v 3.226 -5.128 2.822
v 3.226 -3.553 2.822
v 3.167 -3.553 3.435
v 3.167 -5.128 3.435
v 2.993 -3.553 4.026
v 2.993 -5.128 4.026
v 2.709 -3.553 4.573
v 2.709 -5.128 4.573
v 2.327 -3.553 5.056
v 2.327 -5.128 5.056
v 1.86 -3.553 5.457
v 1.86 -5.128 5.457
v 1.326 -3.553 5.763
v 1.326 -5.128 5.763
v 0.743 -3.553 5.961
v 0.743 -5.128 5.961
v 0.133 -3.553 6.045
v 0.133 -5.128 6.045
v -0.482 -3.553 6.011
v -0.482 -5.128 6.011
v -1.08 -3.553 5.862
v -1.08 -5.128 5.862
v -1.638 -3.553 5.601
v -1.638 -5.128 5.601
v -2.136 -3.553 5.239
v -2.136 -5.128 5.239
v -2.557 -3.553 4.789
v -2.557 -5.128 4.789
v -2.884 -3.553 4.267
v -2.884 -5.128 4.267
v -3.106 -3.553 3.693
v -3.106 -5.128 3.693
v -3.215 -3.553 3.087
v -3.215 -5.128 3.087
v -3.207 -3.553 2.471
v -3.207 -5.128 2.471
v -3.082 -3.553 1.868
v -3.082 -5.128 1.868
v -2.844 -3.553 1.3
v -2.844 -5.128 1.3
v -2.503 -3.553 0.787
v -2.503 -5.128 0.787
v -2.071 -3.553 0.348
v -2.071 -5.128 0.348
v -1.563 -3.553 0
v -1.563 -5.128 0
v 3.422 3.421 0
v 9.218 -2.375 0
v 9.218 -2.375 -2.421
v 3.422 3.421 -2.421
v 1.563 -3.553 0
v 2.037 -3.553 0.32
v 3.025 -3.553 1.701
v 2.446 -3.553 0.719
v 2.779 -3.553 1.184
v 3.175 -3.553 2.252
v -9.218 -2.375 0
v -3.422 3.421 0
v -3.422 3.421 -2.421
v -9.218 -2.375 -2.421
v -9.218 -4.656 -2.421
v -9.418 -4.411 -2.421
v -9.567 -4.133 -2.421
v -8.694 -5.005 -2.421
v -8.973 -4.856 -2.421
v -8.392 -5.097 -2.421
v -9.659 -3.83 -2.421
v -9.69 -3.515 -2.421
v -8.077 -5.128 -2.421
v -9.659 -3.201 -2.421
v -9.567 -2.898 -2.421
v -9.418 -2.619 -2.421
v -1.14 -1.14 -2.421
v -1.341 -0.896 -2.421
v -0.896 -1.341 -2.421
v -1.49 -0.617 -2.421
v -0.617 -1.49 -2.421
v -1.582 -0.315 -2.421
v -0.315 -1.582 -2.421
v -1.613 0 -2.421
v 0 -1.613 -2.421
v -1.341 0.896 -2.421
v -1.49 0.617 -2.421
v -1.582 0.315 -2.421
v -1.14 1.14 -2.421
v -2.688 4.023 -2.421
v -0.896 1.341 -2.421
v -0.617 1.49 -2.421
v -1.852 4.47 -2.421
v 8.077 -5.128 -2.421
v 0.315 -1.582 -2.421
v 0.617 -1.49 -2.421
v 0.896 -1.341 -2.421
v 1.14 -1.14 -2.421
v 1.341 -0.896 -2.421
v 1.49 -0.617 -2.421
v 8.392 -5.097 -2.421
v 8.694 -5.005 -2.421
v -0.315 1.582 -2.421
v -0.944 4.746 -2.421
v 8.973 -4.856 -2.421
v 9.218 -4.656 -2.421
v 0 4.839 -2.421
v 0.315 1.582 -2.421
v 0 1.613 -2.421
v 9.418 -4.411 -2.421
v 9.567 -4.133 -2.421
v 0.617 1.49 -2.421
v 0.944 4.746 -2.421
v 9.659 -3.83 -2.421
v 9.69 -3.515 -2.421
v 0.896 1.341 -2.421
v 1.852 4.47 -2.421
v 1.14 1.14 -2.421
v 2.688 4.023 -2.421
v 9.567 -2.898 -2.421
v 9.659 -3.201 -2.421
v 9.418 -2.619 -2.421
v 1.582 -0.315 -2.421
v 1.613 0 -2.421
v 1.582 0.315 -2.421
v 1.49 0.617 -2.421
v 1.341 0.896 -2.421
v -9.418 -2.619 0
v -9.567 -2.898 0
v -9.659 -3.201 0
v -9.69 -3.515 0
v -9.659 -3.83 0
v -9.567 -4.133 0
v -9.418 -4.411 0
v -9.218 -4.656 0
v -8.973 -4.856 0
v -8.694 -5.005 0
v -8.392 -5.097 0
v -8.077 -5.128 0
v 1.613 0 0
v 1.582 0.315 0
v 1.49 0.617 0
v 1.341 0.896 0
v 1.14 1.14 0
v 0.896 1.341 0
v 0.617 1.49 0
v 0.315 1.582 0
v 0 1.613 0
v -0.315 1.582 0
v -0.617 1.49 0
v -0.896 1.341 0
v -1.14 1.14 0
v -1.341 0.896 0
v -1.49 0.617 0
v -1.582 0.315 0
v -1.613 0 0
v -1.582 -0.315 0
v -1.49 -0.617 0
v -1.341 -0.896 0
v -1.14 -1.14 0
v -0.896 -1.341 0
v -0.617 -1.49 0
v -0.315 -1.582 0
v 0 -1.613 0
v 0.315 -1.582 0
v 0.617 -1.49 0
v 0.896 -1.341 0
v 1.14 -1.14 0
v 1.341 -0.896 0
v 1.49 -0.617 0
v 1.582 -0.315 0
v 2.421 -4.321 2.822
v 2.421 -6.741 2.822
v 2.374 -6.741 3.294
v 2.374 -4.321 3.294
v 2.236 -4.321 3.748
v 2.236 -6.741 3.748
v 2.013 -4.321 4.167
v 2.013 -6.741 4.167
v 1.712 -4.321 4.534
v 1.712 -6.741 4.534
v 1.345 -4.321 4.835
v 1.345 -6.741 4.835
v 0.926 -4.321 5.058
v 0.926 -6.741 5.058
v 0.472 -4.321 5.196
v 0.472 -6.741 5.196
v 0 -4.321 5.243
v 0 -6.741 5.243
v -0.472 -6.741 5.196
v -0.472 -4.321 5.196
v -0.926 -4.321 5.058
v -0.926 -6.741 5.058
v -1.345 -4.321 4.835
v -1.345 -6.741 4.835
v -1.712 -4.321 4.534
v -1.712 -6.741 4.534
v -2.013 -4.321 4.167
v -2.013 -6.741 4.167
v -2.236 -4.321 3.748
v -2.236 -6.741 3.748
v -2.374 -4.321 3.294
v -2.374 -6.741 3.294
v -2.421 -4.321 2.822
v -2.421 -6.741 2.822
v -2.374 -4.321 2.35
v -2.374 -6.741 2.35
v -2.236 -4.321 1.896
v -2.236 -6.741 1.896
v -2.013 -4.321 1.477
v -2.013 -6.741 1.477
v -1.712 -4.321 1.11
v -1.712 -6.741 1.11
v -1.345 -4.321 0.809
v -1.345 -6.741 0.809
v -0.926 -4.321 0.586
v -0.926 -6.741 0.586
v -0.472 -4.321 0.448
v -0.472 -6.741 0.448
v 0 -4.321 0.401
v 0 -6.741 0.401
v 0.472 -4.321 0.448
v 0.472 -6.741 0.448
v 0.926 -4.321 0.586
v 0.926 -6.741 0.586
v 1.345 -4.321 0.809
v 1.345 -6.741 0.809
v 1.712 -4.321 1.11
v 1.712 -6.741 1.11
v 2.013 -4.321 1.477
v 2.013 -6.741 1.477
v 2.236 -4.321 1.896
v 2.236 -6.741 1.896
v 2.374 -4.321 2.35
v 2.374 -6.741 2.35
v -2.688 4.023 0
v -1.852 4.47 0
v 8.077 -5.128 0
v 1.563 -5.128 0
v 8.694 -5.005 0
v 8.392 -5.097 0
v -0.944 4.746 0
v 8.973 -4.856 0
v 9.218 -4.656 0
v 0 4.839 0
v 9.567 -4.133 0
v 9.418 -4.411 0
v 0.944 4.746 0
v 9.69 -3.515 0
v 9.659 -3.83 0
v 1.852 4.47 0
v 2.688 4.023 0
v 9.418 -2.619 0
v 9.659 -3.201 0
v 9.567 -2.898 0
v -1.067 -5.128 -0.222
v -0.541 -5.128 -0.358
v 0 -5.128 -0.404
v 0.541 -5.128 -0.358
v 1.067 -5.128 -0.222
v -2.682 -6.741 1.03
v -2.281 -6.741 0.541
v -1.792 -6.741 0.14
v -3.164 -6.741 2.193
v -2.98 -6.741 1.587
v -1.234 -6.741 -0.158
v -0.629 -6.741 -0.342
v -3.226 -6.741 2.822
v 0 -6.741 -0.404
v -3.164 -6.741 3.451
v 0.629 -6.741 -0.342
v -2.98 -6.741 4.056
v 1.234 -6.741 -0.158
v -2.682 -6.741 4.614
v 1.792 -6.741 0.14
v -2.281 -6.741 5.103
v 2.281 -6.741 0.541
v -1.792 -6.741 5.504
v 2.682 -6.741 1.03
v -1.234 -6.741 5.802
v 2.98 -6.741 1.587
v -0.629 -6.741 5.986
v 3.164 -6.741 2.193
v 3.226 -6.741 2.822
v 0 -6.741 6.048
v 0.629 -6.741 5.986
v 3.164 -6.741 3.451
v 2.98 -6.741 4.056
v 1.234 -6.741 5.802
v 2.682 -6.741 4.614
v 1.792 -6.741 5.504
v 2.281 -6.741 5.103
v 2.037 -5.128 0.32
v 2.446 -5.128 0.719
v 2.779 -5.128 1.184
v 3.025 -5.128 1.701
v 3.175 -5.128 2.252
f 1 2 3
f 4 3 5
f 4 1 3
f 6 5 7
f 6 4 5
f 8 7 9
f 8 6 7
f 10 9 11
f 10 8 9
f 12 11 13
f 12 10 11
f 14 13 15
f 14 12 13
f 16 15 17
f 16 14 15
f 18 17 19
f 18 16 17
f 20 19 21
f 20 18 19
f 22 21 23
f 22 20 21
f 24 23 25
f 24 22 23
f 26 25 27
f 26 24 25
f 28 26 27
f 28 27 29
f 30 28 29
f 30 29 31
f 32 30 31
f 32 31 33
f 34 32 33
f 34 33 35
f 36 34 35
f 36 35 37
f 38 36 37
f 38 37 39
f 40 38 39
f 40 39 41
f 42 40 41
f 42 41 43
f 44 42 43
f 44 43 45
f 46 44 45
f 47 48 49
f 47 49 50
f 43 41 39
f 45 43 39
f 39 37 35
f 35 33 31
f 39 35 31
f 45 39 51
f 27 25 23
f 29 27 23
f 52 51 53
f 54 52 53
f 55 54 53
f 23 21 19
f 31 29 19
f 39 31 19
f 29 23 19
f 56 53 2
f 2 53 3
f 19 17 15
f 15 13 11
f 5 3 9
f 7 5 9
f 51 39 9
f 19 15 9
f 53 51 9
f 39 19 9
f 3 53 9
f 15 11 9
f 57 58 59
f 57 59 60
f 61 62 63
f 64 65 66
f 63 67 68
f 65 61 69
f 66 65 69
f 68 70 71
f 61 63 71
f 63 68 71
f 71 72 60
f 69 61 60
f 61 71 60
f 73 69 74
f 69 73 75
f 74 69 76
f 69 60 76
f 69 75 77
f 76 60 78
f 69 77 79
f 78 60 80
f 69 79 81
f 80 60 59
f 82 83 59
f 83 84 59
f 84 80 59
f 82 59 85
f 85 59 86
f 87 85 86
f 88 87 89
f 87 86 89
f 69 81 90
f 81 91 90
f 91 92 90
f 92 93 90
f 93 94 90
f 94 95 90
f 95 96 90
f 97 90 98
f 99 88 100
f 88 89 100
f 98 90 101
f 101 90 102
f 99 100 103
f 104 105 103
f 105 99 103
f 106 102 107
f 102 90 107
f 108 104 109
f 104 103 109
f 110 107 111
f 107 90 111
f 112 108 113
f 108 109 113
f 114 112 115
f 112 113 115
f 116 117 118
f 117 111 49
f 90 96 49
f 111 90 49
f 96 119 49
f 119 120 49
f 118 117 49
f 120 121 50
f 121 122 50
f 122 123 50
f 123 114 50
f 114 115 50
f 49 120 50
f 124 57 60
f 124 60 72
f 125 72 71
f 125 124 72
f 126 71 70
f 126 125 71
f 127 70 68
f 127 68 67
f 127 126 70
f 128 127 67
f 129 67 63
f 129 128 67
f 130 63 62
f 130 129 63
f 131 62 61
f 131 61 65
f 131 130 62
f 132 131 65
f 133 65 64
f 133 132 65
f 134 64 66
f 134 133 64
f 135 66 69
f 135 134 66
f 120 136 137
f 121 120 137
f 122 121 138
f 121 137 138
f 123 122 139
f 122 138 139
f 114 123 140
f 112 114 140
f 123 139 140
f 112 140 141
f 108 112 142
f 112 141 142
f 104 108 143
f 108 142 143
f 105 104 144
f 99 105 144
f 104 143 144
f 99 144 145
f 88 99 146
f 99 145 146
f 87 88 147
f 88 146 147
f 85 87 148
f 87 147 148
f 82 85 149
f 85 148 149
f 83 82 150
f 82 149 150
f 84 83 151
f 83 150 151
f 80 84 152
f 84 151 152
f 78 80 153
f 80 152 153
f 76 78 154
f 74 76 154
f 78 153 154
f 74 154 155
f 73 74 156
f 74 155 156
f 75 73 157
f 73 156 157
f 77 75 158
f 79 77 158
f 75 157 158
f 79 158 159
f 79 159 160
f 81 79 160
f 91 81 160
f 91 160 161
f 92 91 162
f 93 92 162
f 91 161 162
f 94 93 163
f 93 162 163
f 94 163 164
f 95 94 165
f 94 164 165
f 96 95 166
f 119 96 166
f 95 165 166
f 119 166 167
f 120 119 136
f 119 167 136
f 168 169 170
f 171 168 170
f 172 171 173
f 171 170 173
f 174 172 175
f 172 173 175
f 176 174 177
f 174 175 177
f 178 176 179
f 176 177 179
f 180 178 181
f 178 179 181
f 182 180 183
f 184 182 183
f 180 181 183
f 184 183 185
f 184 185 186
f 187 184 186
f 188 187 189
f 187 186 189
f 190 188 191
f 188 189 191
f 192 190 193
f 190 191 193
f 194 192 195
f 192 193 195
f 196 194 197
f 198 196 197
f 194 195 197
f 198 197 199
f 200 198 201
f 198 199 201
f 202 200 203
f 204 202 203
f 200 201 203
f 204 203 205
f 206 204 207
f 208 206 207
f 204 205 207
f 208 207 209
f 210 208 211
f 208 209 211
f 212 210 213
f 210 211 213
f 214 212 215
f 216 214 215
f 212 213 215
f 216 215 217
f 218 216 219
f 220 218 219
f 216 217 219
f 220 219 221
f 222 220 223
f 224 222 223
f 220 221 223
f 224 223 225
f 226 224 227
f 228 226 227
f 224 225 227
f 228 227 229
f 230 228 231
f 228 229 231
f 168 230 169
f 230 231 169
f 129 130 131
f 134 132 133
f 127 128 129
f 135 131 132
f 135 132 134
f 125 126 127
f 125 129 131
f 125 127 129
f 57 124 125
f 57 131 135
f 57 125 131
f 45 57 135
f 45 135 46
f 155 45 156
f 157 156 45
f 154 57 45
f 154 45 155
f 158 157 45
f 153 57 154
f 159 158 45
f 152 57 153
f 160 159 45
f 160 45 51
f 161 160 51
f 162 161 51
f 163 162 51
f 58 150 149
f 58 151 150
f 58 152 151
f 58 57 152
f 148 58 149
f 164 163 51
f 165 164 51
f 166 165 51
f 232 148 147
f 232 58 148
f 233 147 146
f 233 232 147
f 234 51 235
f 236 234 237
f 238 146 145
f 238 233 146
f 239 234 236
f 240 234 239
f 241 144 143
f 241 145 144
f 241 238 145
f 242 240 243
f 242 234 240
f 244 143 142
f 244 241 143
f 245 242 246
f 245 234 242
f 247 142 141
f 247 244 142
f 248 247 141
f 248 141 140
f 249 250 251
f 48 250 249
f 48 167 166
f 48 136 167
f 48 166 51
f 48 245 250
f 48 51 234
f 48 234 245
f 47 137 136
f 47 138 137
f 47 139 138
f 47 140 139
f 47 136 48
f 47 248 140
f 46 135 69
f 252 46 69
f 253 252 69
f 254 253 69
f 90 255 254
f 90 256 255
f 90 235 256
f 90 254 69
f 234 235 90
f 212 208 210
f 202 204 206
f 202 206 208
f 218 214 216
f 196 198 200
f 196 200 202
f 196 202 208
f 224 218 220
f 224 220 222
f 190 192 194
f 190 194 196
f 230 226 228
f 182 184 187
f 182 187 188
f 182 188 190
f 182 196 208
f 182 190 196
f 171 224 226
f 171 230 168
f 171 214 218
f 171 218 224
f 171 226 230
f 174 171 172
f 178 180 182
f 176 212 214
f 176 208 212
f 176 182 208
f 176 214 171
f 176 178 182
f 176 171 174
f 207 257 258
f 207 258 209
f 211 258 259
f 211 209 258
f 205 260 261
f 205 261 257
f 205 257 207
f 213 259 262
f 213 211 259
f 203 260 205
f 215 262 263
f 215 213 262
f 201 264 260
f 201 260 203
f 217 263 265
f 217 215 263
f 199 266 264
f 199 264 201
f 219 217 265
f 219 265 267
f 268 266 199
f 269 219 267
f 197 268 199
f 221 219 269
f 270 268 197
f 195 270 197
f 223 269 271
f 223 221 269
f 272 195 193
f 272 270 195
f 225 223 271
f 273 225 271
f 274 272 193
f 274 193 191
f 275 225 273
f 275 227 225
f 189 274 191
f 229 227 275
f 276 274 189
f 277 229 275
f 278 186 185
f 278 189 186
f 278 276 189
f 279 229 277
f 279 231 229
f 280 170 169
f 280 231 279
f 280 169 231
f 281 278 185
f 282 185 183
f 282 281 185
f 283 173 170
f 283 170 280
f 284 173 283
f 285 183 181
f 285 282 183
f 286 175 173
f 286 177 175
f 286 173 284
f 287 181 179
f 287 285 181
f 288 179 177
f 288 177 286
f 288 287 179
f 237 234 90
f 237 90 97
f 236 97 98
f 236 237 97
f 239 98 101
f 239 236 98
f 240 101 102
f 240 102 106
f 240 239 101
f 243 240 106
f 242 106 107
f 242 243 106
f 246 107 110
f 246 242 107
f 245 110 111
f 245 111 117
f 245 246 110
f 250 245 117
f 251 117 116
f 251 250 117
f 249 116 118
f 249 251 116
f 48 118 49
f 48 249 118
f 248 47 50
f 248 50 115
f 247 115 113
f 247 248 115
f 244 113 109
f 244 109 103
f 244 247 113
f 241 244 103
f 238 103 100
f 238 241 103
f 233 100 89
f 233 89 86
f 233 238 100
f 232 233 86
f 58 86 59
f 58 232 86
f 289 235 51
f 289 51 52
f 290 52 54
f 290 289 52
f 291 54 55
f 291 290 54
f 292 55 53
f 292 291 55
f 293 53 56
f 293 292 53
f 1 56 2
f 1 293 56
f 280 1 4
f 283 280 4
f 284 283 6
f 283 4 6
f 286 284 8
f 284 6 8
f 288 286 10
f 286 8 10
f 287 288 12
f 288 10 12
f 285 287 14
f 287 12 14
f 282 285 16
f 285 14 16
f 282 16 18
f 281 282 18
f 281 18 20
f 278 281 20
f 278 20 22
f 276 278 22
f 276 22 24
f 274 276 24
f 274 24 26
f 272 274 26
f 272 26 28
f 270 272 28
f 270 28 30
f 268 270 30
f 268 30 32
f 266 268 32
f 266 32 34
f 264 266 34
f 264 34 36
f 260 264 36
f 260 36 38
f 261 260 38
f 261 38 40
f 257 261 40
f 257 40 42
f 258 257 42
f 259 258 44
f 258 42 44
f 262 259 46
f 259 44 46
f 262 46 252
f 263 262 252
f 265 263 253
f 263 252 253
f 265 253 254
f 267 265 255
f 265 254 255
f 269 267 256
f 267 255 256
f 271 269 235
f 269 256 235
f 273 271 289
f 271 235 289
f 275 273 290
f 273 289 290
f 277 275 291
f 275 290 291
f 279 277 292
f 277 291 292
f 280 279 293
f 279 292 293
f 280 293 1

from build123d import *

# Parameters (mm, degrees)
SKETCH1_R                = 1.6129
BOSS_EXTRUDE1_DEPTH      = 2.42062
SKETCH2_R                = 3.2258
BOSS_EXTRUDE2_DEPTH      = 1.6129
BOSS_EXTRUDE2_DEPTH_BACK = 1.5748
SKETCH3_R                = 2.42062
CUT_EXTRUDE1_DEPTH       = 2.42062


with BuildPart() as part:
    # Sketch1 → Boss-Extrude1 (new body)
    with BuildSketch(Plane.XY):
        with BuildLine():
            Line((-8.0772, -5.12826), (8.0772, -5.12826))
            ThreePointArc((8.0772, -5.12826), (9.567321834, -4.13259847), (9.217705328, -2.374880273))
            Line((9.217705328, -2.374880273), (3.421515983, 3.421439181))
            ThreePointArc((3.421515983, 3.421439181), (0, 4.8387), (-3.421515983, 3.421439181))
            Line((-3.421515983, 3.421439181), (-9.217705328, -2.374880273))
            ThreePointArc((-9.217705328, -2.374880273), (-9.567321834, -4.13259847), (-8.0772, -5.12826))
        make_face()
        Circle(SKETCH1_R, mode=Mode.SUBTRACT)
    extrude(amount=-BOSS_EXTRUDE1_DEPTH)

    # Sketch2 → Boss-Extrude2 (add, two sides)
    with BuildSketch(Plane.XZ.offset(5.12826)) as boss_extrude2_sk:
        with Locations((0, 2.82194)):
            Circle(SKETCH2_R)
    extrude(amount=BOSS_EXTRUDE2_DEPTH)
    extrude(boss_extrude2_sk.sketch, amount=-BOSS_EXTRUDE2_DEPTH_BACK)

    # Sketch3 → Cut-Extrude1 (cut)
    with BuildSketch(Plane.XZ.offset(6.74116)):
        with Locations((0, 2.82194)):
            Circle(SKETCH3_R)
    extrude(amount=-CUT_EXTRUDE1_DEPTH, mode=Mode.SUBTRACT)


solid = part.part
